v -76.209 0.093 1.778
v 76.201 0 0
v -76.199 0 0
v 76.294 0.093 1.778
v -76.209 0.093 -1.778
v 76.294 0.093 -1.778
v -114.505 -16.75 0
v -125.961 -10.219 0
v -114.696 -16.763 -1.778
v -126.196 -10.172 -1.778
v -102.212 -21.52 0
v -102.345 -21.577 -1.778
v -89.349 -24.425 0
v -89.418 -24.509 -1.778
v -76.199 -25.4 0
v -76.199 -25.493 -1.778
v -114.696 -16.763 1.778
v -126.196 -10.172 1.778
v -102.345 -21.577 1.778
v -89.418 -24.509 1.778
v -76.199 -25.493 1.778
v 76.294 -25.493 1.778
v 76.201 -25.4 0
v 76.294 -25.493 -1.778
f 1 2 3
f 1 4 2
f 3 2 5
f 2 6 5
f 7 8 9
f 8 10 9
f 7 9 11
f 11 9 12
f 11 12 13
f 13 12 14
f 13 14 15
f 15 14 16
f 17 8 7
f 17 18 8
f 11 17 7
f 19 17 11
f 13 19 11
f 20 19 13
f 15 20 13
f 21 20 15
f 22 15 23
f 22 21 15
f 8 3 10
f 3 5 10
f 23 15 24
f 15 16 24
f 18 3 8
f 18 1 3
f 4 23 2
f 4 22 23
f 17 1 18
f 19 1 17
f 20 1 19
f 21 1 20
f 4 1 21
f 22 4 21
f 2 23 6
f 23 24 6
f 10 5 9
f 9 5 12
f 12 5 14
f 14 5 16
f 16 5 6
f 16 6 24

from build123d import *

# Parameters (mm, degrees)
F0_W     = 152.4
F0_H     = 25.4
F1_DEPTH = 1.778
F1_TAPER = -3


with BuildPart() as f1:
    # F0 (on Top) → F1 (new body, symmetric)
    with BuildSketch(Plane.XY):
        with Locations((0.0009177437, -12.7)):
            Rectangle(F0_W, F0_H)
        with BuildLine():
            Line((-76.1990822563, -25.4), (-76.1990822563, 0))
            Line((-76.1990822563, 0), (-125.9606556381, -10.2188949775))
            ThreePointArc((-125.9606556381, -10.2188949775), (-102.2119643301, -21.5203003803), (-76.1990822563, -25.4))
        make_face()
    extrude(amount=F1_DEPTH, both=True, taper=F1_TAPER)


solid = f1.part
